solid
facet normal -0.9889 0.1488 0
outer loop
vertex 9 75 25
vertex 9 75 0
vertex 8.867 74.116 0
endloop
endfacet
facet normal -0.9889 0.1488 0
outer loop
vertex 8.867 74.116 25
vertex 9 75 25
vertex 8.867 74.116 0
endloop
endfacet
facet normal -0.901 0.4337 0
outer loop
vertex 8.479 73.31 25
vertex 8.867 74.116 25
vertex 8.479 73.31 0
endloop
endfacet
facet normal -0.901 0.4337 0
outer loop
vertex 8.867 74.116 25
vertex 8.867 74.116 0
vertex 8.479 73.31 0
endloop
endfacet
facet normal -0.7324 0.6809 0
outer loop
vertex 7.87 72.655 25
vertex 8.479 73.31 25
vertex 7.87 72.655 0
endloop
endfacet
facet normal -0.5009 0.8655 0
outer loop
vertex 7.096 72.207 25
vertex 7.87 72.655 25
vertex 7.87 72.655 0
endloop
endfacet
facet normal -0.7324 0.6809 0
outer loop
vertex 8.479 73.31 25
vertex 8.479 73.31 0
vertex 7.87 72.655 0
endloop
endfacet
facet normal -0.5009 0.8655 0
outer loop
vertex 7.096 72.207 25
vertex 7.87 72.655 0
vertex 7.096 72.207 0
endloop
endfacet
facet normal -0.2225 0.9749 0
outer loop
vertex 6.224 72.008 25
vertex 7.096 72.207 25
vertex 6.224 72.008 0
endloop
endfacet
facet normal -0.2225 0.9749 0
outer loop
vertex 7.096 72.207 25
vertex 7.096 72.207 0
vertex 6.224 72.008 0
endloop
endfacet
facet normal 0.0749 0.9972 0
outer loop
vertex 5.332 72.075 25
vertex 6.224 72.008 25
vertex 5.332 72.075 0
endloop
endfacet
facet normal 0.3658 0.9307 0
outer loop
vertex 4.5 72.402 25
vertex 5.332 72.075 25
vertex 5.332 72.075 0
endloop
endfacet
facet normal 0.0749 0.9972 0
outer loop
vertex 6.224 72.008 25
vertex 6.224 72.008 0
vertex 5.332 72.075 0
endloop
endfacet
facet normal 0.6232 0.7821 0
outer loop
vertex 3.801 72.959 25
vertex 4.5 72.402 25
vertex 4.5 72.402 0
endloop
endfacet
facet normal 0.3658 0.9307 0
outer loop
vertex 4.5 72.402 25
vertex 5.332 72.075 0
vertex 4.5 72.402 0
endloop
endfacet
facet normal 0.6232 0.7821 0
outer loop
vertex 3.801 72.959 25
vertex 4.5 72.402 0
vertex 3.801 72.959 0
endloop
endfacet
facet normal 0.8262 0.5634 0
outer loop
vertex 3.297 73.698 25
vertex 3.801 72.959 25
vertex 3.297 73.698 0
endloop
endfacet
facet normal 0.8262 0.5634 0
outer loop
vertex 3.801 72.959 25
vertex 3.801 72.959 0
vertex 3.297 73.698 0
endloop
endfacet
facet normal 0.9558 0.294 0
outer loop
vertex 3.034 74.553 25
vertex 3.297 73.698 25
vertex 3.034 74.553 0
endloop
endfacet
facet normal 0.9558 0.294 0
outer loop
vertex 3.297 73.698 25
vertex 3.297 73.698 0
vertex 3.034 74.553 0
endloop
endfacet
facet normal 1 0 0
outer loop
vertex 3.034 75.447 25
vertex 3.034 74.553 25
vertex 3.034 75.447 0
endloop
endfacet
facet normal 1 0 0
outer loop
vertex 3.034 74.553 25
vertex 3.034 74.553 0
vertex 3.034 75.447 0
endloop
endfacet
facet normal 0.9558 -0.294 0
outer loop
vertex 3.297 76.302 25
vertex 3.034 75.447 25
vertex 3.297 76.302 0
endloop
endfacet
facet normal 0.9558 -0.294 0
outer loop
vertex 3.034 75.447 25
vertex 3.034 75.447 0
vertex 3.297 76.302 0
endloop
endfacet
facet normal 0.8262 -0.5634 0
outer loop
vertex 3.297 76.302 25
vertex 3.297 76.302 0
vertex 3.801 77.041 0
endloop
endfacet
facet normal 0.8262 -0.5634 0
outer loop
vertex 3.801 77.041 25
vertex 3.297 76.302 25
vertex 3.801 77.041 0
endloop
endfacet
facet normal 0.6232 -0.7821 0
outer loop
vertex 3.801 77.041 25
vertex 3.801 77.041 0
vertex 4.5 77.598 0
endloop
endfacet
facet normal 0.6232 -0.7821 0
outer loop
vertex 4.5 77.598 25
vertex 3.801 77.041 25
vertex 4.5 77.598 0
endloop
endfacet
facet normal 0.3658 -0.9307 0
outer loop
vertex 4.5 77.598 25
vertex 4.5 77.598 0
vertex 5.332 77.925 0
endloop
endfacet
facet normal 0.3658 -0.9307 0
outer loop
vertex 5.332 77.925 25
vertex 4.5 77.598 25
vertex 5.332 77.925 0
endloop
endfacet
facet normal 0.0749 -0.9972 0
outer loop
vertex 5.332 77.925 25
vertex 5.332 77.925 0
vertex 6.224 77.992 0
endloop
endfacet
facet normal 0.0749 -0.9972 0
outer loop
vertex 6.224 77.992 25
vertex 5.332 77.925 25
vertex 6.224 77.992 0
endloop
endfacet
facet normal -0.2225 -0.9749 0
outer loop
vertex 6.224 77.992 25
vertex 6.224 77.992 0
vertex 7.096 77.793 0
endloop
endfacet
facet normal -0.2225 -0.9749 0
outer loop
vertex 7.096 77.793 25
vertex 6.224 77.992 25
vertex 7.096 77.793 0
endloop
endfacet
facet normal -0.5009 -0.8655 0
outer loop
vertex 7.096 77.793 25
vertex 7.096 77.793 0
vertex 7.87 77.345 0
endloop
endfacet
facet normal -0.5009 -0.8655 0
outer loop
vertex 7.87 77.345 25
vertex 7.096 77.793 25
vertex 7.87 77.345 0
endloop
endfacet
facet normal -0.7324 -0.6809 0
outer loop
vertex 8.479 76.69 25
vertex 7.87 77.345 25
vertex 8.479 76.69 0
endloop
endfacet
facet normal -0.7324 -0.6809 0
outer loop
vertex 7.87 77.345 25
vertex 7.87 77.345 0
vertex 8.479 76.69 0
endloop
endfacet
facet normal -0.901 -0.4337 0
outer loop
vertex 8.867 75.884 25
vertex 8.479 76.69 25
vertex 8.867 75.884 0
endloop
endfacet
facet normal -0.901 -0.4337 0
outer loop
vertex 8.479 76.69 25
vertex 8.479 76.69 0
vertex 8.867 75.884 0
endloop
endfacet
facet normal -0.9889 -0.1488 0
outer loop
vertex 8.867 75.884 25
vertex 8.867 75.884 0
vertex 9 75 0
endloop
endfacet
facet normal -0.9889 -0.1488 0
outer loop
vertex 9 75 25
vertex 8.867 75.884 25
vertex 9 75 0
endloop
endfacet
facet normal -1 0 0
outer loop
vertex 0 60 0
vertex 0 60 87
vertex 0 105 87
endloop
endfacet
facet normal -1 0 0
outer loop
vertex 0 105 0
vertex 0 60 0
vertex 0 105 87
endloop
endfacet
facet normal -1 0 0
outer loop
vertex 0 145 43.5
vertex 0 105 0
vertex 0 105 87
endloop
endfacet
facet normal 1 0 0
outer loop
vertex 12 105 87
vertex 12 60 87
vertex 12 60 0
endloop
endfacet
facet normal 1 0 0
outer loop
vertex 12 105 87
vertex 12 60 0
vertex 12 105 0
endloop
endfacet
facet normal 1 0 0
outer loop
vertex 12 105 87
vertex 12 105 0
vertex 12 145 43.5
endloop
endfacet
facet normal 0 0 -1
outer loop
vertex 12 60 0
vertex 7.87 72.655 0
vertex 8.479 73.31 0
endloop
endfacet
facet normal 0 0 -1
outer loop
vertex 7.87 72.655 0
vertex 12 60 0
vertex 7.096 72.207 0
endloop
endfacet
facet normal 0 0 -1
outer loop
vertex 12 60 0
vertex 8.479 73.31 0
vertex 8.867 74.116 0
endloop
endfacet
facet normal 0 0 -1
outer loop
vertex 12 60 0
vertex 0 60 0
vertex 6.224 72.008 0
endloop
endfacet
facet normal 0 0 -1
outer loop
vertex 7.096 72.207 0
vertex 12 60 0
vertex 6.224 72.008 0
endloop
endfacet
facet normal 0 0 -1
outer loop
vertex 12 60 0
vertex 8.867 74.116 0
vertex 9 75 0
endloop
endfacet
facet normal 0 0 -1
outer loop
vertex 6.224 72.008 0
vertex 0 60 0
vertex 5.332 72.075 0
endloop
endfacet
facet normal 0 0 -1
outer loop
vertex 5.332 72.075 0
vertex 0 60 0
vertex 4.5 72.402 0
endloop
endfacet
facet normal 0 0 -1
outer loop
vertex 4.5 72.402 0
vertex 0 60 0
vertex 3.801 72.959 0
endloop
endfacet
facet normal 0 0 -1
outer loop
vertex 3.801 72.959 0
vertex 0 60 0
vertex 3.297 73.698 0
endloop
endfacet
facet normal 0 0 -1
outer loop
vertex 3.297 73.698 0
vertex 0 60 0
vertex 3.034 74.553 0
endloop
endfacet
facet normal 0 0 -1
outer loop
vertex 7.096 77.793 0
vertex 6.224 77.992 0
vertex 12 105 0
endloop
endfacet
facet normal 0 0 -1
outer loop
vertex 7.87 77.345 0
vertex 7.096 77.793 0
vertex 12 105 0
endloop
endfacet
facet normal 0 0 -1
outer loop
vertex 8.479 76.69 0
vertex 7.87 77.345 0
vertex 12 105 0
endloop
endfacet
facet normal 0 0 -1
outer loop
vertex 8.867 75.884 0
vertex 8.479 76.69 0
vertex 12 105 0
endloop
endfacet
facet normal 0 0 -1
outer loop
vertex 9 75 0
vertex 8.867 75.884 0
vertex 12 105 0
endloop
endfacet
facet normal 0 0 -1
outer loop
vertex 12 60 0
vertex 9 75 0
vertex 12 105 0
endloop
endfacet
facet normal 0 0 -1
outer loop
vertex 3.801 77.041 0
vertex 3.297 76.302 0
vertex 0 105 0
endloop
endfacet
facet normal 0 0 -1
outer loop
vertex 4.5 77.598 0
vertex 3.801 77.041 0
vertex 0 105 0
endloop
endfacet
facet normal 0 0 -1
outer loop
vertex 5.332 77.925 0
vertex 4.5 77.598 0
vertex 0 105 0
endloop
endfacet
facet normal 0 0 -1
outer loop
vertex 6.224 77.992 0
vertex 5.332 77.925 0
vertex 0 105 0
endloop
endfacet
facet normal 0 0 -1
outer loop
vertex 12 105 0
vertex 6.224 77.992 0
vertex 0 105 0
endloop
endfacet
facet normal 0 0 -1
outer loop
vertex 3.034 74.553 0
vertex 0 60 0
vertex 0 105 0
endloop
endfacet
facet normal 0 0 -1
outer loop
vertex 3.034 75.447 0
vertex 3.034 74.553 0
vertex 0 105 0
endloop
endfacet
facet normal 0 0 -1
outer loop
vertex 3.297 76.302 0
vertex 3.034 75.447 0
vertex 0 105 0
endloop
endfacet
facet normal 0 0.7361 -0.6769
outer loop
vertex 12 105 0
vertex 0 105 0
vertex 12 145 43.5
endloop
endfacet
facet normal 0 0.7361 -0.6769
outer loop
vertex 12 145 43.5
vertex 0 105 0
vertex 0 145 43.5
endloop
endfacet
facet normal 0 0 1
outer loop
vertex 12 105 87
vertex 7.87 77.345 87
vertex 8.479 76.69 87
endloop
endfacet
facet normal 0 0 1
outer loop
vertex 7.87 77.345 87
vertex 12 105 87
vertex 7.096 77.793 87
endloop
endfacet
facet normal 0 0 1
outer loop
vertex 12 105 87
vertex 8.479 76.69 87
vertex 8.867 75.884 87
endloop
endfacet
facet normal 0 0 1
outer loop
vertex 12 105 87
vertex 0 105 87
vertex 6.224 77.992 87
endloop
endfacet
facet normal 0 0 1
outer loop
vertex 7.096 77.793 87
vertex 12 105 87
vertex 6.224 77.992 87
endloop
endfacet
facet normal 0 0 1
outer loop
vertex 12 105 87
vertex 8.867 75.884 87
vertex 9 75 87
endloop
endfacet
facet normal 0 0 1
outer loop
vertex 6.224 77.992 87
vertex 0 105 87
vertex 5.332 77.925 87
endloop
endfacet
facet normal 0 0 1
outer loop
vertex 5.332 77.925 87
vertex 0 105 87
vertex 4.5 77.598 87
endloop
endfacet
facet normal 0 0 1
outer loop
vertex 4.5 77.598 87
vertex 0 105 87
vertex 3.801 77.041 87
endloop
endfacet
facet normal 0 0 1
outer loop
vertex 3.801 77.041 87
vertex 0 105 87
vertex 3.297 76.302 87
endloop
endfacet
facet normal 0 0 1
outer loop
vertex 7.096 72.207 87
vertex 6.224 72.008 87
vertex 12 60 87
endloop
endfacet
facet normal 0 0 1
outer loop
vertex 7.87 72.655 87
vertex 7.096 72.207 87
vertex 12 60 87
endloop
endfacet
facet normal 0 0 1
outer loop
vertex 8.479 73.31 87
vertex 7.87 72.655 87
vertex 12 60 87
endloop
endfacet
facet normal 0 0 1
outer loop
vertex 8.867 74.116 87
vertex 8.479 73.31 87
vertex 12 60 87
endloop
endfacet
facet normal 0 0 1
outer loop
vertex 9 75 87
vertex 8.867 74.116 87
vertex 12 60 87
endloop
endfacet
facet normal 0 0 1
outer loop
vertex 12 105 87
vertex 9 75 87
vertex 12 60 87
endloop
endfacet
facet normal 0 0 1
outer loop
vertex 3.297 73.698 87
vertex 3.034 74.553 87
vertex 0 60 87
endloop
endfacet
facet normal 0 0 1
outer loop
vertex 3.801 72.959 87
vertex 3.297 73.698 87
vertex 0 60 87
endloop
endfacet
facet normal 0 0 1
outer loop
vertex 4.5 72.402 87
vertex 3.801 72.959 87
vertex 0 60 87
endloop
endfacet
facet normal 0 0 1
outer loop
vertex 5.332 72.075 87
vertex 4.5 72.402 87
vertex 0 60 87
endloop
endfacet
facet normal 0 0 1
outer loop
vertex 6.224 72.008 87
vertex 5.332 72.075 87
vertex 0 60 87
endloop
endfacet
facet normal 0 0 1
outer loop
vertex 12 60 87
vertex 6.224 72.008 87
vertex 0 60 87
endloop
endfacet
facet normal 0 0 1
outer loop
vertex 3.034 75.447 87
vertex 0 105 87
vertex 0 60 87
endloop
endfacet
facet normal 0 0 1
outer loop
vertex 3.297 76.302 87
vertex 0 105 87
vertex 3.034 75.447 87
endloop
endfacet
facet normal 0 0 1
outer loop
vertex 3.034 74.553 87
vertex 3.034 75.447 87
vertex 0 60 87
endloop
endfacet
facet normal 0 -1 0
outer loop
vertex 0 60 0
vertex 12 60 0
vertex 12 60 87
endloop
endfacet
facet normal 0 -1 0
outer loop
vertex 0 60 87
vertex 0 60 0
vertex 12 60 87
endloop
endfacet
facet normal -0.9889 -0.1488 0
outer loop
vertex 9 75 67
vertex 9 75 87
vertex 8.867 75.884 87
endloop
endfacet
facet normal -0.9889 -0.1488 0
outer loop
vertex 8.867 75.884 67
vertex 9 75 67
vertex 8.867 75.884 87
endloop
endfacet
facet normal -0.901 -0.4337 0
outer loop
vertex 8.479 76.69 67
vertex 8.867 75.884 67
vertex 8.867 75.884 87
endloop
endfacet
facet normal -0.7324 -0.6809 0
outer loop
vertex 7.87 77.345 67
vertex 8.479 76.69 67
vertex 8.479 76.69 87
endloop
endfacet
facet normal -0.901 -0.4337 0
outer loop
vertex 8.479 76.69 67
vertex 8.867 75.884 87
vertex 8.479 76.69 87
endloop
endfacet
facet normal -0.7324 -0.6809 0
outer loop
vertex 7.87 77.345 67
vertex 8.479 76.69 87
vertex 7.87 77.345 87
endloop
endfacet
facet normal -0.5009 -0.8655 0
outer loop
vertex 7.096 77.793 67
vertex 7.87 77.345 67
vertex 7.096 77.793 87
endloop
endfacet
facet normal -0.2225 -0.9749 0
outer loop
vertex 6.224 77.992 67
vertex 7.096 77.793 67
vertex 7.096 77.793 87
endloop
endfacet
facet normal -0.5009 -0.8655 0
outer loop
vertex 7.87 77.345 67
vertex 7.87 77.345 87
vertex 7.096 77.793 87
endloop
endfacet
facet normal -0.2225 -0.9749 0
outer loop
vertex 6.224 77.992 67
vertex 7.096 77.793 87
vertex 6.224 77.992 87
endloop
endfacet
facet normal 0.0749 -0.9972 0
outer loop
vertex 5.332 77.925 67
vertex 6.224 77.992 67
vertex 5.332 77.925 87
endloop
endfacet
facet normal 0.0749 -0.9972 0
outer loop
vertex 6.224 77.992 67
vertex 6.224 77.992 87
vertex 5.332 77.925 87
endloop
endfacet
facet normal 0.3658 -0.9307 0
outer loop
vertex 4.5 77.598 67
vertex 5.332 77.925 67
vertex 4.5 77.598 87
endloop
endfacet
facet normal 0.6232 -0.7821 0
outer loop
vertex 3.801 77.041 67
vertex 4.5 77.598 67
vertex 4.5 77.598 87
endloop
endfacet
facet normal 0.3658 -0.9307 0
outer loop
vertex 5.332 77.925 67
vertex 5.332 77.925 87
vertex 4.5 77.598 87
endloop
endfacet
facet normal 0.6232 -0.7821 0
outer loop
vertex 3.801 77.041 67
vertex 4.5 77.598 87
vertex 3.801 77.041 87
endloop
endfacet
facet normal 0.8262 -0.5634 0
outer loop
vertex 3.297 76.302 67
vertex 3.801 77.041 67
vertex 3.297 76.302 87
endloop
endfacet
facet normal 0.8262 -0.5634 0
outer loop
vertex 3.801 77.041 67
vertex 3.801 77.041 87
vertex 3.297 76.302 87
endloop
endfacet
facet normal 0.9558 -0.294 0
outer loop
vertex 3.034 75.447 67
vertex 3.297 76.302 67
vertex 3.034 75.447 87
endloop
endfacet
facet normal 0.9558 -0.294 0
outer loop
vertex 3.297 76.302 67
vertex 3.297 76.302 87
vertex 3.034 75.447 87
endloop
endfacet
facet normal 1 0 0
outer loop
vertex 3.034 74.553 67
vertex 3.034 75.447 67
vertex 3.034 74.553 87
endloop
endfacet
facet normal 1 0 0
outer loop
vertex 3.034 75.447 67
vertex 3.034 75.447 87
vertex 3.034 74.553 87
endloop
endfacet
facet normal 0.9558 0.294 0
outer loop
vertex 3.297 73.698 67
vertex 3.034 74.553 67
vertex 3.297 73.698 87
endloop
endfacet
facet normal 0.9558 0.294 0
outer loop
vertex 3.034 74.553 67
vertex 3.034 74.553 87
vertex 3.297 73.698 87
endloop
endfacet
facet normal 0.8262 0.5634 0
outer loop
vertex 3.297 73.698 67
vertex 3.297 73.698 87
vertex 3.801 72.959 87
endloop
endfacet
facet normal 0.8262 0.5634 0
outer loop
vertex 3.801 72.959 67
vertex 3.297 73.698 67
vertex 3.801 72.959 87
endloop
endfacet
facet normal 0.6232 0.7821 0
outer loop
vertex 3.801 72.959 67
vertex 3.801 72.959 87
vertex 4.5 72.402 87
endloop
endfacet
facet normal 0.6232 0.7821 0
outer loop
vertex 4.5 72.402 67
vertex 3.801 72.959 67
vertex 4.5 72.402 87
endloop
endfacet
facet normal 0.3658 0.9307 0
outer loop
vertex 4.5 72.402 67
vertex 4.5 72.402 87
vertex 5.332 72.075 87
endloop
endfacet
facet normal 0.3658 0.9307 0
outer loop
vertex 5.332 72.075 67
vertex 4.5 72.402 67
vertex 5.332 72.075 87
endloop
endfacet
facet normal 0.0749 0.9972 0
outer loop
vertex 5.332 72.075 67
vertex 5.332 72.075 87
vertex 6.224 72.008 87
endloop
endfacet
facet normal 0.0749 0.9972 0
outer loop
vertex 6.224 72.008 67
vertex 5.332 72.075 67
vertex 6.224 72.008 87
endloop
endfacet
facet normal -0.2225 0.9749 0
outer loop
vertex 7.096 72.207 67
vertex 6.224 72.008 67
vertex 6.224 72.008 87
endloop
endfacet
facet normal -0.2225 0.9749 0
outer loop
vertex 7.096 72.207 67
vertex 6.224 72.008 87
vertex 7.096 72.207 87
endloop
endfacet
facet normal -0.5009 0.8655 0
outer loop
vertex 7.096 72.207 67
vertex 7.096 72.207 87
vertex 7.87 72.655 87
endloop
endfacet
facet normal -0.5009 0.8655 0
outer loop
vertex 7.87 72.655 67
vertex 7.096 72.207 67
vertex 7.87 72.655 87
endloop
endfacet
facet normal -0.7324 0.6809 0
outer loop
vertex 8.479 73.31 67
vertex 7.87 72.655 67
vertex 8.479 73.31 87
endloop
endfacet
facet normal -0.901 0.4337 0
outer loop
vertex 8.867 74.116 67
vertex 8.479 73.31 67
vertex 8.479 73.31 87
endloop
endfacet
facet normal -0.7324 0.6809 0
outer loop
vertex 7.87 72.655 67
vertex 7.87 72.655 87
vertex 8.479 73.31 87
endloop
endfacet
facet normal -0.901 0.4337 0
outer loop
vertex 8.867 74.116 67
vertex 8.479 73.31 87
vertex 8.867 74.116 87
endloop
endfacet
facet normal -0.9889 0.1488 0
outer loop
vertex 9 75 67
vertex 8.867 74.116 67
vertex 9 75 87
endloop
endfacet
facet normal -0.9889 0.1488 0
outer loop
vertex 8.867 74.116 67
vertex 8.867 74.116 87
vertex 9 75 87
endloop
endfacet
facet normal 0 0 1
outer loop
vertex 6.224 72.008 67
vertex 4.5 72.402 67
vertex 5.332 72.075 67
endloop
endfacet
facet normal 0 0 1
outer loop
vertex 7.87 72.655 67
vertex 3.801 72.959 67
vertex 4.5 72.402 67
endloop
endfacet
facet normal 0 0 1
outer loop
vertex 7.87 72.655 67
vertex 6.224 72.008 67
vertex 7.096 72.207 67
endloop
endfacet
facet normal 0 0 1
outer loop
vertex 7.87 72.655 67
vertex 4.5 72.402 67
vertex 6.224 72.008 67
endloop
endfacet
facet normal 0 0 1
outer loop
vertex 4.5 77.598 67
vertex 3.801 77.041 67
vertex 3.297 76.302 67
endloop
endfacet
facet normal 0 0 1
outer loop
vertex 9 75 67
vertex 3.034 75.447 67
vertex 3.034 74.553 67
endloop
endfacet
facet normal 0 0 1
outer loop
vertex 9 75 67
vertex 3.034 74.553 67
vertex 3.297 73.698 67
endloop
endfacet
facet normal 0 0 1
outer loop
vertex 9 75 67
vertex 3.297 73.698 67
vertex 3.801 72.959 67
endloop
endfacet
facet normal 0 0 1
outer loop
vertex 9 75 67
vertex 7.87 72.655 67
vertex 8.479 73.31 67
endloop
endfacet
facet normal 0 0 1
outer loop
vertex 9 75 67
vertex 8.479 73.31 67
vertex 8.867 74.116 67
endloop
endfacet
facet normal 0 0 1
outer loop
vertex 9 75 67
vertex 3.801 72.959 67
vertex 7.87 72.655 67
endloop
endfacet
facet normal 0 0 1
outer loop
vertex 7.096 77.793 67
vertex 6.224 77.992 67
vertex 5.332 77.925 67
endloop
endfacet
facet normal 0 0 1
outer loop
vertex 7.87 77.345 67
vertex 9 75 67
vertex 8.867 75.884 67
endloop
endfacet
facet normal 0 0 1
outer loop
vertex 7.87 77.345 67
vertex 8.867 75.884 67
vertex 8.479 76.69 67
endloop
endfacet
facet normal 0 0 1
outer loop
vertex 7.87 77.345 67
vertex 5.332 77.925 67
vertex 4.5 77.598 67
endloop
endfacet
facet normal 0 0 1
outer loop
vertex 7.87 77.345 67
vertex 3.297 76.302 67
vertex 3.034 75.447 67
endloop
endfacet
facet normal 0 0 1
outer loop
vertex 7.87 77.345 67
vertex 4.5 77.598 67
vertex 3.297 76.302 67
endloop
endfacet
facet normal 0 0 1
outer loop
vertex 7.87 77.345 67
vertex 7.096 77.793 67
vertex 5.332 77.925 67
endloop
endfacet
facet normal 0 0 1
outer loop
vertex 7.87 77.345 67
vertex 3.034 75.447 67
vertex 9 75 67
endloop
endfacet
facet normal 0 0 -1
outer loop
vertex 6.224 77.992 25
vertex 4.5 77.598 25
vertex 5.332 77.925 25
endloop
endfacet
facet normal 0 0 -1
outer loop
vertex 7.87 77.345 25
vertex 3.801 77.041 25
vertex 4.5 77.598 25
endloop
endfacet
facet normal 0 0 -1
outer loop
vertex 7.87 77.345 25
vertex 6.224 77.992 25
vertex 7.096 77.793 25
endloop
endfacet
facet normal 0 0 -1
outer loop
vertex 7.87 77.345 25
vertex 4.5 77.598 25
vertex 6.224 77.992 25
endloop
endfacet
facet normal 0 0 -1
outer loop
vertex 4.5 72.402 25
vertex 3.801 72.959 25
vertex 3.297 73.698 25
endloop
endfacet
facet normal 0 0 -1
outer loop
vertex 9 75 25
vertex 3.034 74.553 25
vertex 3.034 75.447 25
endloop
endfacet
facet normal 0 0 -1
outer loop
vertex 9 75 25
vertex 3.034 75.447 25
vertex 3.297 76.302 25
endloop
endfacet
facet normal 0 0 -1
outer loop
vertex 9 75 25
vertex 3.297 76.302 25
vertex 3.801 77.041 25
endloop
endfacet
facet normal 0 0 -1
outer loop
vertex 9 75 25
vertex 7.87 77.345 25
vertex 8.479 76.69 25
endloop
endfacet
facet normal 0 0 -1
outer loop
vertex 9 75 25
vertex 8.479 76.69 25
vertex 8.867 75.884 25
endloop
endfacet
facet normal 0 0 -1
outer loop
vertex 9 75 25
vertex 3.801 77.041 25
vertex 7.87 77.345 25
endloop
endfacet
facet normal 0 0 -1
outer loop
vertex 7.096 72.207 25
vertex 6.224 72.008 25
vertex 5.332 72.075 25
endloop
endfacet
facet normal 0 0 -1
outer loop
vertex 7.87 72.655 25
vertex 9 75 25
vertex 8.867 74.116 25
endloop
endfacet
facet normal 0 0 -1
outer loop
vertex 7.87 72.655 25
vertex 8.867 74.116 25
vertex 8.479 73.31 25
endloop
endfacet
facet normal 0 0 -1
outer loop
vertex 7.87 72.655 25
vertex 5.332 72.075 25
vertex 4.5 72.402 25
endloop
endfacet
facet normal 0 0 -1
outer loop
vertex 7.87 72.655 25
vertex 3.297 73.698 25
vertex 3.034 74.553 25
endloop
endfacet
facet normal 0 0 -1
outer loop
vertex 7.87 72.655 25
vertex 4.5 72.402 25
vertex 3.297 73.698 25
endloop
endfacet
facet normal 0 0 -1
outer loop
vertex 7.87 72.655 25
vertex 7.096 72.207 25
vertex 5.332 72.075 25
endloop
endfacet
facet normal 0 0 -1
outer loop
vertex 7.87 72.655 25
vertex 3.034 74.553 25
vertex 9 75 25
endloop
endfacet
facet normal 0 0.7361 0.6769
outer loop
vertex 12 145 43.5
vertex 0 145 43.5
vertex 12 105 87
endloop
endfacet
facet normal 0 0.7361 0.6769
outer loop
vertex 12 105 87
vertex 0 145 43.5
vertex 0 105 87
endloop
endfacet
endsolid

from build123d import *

# Parameters (mm, degrees)
F1_DEPTH = 12
F2_R     = 3
F3_DEPTH = 20
F4_R     = 3
F5_DEPTH = 25
F6_R     = 2
F7_DEPTH = 25
F8_W     = 60
F8_H     = 87
F9_DEPTH = 25


with BuildPart() as f1:
    # F0 (on Right) → F1 (new body)
    with BuildSketch(Plane.YZ):
        Polygon((0, 87), (0, 0), (105, 0), (145, 43.5), (105, 87), align=None)
    extrude(amount=F1_DEPTH)

    # F2 (on face) → F3 (cut)
    with BuildSketch(Plane.XY.offset(87)):
        with Locations((6, 15)):
            Circle(F2_R)
        with Locations((6, 45)):
            Circle(F2_R)
        with Locations((6, 75)):
            Circle(F2_R)
    extrude(amount=-F3_DEPTH, mode=Mode.SUBTRACT)

    # F4 (on face) → F5 (cut)
    with BuildSketch(Plane(origin=(0, 0, 0), x_dir=(1, 0, 0), z_dir=(0, 0, -1))):
        with BuildLine():
            Line((6, -15), (9, -15))
            ThreePointArc((9, -15), (8.12132, -12.87868), (6, -12))
            Line((6, -12), (6, -15))
        make_face()
        with BuildLine():
            ThreePointArc((9, -45), (8.12132, -42.87868), (6, -42))
            ThreePointArc((6, -42), (3.87868, -47.12132), (9, -45))
        make_face()
        with BuildLine():
            ThreePointArc((6, -18), (8.12132, -17.12132), (9, -15))
            Line((9, -15), (6, -15))
            Line((6, -15), (6, -18))
        make_face()
        with BuildLine():
            Line((6, -15), (6, -12))
            ThreePointArc((6, -12), (3, -15), (6, -18))
            Line((6, -18), (6, -15))
        make_face()
        with Locations((6, -75)):
            Circle(F4_R)
    extrude(amount=-F5_DEPTH, mode=Mode.SUBTRACT)

    # F6 (on face) → F7 (cut)
    with BuildSketch(Plane(origin=(0, 0, 0), x_dir=(0, -1, 0), z_dir=(-1, 0, 0))):
        with Locations((-6, 77)):
            Circle(F6_R)
        with Locations((-6, 10)):
            Circle(F6_R)
    extrude(amount=-F7_DEPTH, mode=Mode.SUBTRACT)

    # F8 (on face) → F9 (cut)
    with BuildSketch(Plane.YZ.offset(12)):
        with Locations((30, 43.5)):
            Rectangle(F8_W, F8_H)
    extrude(amount=-F9_DEPTH, mode=Mode.SUBTRACT)


solid = f1.part
